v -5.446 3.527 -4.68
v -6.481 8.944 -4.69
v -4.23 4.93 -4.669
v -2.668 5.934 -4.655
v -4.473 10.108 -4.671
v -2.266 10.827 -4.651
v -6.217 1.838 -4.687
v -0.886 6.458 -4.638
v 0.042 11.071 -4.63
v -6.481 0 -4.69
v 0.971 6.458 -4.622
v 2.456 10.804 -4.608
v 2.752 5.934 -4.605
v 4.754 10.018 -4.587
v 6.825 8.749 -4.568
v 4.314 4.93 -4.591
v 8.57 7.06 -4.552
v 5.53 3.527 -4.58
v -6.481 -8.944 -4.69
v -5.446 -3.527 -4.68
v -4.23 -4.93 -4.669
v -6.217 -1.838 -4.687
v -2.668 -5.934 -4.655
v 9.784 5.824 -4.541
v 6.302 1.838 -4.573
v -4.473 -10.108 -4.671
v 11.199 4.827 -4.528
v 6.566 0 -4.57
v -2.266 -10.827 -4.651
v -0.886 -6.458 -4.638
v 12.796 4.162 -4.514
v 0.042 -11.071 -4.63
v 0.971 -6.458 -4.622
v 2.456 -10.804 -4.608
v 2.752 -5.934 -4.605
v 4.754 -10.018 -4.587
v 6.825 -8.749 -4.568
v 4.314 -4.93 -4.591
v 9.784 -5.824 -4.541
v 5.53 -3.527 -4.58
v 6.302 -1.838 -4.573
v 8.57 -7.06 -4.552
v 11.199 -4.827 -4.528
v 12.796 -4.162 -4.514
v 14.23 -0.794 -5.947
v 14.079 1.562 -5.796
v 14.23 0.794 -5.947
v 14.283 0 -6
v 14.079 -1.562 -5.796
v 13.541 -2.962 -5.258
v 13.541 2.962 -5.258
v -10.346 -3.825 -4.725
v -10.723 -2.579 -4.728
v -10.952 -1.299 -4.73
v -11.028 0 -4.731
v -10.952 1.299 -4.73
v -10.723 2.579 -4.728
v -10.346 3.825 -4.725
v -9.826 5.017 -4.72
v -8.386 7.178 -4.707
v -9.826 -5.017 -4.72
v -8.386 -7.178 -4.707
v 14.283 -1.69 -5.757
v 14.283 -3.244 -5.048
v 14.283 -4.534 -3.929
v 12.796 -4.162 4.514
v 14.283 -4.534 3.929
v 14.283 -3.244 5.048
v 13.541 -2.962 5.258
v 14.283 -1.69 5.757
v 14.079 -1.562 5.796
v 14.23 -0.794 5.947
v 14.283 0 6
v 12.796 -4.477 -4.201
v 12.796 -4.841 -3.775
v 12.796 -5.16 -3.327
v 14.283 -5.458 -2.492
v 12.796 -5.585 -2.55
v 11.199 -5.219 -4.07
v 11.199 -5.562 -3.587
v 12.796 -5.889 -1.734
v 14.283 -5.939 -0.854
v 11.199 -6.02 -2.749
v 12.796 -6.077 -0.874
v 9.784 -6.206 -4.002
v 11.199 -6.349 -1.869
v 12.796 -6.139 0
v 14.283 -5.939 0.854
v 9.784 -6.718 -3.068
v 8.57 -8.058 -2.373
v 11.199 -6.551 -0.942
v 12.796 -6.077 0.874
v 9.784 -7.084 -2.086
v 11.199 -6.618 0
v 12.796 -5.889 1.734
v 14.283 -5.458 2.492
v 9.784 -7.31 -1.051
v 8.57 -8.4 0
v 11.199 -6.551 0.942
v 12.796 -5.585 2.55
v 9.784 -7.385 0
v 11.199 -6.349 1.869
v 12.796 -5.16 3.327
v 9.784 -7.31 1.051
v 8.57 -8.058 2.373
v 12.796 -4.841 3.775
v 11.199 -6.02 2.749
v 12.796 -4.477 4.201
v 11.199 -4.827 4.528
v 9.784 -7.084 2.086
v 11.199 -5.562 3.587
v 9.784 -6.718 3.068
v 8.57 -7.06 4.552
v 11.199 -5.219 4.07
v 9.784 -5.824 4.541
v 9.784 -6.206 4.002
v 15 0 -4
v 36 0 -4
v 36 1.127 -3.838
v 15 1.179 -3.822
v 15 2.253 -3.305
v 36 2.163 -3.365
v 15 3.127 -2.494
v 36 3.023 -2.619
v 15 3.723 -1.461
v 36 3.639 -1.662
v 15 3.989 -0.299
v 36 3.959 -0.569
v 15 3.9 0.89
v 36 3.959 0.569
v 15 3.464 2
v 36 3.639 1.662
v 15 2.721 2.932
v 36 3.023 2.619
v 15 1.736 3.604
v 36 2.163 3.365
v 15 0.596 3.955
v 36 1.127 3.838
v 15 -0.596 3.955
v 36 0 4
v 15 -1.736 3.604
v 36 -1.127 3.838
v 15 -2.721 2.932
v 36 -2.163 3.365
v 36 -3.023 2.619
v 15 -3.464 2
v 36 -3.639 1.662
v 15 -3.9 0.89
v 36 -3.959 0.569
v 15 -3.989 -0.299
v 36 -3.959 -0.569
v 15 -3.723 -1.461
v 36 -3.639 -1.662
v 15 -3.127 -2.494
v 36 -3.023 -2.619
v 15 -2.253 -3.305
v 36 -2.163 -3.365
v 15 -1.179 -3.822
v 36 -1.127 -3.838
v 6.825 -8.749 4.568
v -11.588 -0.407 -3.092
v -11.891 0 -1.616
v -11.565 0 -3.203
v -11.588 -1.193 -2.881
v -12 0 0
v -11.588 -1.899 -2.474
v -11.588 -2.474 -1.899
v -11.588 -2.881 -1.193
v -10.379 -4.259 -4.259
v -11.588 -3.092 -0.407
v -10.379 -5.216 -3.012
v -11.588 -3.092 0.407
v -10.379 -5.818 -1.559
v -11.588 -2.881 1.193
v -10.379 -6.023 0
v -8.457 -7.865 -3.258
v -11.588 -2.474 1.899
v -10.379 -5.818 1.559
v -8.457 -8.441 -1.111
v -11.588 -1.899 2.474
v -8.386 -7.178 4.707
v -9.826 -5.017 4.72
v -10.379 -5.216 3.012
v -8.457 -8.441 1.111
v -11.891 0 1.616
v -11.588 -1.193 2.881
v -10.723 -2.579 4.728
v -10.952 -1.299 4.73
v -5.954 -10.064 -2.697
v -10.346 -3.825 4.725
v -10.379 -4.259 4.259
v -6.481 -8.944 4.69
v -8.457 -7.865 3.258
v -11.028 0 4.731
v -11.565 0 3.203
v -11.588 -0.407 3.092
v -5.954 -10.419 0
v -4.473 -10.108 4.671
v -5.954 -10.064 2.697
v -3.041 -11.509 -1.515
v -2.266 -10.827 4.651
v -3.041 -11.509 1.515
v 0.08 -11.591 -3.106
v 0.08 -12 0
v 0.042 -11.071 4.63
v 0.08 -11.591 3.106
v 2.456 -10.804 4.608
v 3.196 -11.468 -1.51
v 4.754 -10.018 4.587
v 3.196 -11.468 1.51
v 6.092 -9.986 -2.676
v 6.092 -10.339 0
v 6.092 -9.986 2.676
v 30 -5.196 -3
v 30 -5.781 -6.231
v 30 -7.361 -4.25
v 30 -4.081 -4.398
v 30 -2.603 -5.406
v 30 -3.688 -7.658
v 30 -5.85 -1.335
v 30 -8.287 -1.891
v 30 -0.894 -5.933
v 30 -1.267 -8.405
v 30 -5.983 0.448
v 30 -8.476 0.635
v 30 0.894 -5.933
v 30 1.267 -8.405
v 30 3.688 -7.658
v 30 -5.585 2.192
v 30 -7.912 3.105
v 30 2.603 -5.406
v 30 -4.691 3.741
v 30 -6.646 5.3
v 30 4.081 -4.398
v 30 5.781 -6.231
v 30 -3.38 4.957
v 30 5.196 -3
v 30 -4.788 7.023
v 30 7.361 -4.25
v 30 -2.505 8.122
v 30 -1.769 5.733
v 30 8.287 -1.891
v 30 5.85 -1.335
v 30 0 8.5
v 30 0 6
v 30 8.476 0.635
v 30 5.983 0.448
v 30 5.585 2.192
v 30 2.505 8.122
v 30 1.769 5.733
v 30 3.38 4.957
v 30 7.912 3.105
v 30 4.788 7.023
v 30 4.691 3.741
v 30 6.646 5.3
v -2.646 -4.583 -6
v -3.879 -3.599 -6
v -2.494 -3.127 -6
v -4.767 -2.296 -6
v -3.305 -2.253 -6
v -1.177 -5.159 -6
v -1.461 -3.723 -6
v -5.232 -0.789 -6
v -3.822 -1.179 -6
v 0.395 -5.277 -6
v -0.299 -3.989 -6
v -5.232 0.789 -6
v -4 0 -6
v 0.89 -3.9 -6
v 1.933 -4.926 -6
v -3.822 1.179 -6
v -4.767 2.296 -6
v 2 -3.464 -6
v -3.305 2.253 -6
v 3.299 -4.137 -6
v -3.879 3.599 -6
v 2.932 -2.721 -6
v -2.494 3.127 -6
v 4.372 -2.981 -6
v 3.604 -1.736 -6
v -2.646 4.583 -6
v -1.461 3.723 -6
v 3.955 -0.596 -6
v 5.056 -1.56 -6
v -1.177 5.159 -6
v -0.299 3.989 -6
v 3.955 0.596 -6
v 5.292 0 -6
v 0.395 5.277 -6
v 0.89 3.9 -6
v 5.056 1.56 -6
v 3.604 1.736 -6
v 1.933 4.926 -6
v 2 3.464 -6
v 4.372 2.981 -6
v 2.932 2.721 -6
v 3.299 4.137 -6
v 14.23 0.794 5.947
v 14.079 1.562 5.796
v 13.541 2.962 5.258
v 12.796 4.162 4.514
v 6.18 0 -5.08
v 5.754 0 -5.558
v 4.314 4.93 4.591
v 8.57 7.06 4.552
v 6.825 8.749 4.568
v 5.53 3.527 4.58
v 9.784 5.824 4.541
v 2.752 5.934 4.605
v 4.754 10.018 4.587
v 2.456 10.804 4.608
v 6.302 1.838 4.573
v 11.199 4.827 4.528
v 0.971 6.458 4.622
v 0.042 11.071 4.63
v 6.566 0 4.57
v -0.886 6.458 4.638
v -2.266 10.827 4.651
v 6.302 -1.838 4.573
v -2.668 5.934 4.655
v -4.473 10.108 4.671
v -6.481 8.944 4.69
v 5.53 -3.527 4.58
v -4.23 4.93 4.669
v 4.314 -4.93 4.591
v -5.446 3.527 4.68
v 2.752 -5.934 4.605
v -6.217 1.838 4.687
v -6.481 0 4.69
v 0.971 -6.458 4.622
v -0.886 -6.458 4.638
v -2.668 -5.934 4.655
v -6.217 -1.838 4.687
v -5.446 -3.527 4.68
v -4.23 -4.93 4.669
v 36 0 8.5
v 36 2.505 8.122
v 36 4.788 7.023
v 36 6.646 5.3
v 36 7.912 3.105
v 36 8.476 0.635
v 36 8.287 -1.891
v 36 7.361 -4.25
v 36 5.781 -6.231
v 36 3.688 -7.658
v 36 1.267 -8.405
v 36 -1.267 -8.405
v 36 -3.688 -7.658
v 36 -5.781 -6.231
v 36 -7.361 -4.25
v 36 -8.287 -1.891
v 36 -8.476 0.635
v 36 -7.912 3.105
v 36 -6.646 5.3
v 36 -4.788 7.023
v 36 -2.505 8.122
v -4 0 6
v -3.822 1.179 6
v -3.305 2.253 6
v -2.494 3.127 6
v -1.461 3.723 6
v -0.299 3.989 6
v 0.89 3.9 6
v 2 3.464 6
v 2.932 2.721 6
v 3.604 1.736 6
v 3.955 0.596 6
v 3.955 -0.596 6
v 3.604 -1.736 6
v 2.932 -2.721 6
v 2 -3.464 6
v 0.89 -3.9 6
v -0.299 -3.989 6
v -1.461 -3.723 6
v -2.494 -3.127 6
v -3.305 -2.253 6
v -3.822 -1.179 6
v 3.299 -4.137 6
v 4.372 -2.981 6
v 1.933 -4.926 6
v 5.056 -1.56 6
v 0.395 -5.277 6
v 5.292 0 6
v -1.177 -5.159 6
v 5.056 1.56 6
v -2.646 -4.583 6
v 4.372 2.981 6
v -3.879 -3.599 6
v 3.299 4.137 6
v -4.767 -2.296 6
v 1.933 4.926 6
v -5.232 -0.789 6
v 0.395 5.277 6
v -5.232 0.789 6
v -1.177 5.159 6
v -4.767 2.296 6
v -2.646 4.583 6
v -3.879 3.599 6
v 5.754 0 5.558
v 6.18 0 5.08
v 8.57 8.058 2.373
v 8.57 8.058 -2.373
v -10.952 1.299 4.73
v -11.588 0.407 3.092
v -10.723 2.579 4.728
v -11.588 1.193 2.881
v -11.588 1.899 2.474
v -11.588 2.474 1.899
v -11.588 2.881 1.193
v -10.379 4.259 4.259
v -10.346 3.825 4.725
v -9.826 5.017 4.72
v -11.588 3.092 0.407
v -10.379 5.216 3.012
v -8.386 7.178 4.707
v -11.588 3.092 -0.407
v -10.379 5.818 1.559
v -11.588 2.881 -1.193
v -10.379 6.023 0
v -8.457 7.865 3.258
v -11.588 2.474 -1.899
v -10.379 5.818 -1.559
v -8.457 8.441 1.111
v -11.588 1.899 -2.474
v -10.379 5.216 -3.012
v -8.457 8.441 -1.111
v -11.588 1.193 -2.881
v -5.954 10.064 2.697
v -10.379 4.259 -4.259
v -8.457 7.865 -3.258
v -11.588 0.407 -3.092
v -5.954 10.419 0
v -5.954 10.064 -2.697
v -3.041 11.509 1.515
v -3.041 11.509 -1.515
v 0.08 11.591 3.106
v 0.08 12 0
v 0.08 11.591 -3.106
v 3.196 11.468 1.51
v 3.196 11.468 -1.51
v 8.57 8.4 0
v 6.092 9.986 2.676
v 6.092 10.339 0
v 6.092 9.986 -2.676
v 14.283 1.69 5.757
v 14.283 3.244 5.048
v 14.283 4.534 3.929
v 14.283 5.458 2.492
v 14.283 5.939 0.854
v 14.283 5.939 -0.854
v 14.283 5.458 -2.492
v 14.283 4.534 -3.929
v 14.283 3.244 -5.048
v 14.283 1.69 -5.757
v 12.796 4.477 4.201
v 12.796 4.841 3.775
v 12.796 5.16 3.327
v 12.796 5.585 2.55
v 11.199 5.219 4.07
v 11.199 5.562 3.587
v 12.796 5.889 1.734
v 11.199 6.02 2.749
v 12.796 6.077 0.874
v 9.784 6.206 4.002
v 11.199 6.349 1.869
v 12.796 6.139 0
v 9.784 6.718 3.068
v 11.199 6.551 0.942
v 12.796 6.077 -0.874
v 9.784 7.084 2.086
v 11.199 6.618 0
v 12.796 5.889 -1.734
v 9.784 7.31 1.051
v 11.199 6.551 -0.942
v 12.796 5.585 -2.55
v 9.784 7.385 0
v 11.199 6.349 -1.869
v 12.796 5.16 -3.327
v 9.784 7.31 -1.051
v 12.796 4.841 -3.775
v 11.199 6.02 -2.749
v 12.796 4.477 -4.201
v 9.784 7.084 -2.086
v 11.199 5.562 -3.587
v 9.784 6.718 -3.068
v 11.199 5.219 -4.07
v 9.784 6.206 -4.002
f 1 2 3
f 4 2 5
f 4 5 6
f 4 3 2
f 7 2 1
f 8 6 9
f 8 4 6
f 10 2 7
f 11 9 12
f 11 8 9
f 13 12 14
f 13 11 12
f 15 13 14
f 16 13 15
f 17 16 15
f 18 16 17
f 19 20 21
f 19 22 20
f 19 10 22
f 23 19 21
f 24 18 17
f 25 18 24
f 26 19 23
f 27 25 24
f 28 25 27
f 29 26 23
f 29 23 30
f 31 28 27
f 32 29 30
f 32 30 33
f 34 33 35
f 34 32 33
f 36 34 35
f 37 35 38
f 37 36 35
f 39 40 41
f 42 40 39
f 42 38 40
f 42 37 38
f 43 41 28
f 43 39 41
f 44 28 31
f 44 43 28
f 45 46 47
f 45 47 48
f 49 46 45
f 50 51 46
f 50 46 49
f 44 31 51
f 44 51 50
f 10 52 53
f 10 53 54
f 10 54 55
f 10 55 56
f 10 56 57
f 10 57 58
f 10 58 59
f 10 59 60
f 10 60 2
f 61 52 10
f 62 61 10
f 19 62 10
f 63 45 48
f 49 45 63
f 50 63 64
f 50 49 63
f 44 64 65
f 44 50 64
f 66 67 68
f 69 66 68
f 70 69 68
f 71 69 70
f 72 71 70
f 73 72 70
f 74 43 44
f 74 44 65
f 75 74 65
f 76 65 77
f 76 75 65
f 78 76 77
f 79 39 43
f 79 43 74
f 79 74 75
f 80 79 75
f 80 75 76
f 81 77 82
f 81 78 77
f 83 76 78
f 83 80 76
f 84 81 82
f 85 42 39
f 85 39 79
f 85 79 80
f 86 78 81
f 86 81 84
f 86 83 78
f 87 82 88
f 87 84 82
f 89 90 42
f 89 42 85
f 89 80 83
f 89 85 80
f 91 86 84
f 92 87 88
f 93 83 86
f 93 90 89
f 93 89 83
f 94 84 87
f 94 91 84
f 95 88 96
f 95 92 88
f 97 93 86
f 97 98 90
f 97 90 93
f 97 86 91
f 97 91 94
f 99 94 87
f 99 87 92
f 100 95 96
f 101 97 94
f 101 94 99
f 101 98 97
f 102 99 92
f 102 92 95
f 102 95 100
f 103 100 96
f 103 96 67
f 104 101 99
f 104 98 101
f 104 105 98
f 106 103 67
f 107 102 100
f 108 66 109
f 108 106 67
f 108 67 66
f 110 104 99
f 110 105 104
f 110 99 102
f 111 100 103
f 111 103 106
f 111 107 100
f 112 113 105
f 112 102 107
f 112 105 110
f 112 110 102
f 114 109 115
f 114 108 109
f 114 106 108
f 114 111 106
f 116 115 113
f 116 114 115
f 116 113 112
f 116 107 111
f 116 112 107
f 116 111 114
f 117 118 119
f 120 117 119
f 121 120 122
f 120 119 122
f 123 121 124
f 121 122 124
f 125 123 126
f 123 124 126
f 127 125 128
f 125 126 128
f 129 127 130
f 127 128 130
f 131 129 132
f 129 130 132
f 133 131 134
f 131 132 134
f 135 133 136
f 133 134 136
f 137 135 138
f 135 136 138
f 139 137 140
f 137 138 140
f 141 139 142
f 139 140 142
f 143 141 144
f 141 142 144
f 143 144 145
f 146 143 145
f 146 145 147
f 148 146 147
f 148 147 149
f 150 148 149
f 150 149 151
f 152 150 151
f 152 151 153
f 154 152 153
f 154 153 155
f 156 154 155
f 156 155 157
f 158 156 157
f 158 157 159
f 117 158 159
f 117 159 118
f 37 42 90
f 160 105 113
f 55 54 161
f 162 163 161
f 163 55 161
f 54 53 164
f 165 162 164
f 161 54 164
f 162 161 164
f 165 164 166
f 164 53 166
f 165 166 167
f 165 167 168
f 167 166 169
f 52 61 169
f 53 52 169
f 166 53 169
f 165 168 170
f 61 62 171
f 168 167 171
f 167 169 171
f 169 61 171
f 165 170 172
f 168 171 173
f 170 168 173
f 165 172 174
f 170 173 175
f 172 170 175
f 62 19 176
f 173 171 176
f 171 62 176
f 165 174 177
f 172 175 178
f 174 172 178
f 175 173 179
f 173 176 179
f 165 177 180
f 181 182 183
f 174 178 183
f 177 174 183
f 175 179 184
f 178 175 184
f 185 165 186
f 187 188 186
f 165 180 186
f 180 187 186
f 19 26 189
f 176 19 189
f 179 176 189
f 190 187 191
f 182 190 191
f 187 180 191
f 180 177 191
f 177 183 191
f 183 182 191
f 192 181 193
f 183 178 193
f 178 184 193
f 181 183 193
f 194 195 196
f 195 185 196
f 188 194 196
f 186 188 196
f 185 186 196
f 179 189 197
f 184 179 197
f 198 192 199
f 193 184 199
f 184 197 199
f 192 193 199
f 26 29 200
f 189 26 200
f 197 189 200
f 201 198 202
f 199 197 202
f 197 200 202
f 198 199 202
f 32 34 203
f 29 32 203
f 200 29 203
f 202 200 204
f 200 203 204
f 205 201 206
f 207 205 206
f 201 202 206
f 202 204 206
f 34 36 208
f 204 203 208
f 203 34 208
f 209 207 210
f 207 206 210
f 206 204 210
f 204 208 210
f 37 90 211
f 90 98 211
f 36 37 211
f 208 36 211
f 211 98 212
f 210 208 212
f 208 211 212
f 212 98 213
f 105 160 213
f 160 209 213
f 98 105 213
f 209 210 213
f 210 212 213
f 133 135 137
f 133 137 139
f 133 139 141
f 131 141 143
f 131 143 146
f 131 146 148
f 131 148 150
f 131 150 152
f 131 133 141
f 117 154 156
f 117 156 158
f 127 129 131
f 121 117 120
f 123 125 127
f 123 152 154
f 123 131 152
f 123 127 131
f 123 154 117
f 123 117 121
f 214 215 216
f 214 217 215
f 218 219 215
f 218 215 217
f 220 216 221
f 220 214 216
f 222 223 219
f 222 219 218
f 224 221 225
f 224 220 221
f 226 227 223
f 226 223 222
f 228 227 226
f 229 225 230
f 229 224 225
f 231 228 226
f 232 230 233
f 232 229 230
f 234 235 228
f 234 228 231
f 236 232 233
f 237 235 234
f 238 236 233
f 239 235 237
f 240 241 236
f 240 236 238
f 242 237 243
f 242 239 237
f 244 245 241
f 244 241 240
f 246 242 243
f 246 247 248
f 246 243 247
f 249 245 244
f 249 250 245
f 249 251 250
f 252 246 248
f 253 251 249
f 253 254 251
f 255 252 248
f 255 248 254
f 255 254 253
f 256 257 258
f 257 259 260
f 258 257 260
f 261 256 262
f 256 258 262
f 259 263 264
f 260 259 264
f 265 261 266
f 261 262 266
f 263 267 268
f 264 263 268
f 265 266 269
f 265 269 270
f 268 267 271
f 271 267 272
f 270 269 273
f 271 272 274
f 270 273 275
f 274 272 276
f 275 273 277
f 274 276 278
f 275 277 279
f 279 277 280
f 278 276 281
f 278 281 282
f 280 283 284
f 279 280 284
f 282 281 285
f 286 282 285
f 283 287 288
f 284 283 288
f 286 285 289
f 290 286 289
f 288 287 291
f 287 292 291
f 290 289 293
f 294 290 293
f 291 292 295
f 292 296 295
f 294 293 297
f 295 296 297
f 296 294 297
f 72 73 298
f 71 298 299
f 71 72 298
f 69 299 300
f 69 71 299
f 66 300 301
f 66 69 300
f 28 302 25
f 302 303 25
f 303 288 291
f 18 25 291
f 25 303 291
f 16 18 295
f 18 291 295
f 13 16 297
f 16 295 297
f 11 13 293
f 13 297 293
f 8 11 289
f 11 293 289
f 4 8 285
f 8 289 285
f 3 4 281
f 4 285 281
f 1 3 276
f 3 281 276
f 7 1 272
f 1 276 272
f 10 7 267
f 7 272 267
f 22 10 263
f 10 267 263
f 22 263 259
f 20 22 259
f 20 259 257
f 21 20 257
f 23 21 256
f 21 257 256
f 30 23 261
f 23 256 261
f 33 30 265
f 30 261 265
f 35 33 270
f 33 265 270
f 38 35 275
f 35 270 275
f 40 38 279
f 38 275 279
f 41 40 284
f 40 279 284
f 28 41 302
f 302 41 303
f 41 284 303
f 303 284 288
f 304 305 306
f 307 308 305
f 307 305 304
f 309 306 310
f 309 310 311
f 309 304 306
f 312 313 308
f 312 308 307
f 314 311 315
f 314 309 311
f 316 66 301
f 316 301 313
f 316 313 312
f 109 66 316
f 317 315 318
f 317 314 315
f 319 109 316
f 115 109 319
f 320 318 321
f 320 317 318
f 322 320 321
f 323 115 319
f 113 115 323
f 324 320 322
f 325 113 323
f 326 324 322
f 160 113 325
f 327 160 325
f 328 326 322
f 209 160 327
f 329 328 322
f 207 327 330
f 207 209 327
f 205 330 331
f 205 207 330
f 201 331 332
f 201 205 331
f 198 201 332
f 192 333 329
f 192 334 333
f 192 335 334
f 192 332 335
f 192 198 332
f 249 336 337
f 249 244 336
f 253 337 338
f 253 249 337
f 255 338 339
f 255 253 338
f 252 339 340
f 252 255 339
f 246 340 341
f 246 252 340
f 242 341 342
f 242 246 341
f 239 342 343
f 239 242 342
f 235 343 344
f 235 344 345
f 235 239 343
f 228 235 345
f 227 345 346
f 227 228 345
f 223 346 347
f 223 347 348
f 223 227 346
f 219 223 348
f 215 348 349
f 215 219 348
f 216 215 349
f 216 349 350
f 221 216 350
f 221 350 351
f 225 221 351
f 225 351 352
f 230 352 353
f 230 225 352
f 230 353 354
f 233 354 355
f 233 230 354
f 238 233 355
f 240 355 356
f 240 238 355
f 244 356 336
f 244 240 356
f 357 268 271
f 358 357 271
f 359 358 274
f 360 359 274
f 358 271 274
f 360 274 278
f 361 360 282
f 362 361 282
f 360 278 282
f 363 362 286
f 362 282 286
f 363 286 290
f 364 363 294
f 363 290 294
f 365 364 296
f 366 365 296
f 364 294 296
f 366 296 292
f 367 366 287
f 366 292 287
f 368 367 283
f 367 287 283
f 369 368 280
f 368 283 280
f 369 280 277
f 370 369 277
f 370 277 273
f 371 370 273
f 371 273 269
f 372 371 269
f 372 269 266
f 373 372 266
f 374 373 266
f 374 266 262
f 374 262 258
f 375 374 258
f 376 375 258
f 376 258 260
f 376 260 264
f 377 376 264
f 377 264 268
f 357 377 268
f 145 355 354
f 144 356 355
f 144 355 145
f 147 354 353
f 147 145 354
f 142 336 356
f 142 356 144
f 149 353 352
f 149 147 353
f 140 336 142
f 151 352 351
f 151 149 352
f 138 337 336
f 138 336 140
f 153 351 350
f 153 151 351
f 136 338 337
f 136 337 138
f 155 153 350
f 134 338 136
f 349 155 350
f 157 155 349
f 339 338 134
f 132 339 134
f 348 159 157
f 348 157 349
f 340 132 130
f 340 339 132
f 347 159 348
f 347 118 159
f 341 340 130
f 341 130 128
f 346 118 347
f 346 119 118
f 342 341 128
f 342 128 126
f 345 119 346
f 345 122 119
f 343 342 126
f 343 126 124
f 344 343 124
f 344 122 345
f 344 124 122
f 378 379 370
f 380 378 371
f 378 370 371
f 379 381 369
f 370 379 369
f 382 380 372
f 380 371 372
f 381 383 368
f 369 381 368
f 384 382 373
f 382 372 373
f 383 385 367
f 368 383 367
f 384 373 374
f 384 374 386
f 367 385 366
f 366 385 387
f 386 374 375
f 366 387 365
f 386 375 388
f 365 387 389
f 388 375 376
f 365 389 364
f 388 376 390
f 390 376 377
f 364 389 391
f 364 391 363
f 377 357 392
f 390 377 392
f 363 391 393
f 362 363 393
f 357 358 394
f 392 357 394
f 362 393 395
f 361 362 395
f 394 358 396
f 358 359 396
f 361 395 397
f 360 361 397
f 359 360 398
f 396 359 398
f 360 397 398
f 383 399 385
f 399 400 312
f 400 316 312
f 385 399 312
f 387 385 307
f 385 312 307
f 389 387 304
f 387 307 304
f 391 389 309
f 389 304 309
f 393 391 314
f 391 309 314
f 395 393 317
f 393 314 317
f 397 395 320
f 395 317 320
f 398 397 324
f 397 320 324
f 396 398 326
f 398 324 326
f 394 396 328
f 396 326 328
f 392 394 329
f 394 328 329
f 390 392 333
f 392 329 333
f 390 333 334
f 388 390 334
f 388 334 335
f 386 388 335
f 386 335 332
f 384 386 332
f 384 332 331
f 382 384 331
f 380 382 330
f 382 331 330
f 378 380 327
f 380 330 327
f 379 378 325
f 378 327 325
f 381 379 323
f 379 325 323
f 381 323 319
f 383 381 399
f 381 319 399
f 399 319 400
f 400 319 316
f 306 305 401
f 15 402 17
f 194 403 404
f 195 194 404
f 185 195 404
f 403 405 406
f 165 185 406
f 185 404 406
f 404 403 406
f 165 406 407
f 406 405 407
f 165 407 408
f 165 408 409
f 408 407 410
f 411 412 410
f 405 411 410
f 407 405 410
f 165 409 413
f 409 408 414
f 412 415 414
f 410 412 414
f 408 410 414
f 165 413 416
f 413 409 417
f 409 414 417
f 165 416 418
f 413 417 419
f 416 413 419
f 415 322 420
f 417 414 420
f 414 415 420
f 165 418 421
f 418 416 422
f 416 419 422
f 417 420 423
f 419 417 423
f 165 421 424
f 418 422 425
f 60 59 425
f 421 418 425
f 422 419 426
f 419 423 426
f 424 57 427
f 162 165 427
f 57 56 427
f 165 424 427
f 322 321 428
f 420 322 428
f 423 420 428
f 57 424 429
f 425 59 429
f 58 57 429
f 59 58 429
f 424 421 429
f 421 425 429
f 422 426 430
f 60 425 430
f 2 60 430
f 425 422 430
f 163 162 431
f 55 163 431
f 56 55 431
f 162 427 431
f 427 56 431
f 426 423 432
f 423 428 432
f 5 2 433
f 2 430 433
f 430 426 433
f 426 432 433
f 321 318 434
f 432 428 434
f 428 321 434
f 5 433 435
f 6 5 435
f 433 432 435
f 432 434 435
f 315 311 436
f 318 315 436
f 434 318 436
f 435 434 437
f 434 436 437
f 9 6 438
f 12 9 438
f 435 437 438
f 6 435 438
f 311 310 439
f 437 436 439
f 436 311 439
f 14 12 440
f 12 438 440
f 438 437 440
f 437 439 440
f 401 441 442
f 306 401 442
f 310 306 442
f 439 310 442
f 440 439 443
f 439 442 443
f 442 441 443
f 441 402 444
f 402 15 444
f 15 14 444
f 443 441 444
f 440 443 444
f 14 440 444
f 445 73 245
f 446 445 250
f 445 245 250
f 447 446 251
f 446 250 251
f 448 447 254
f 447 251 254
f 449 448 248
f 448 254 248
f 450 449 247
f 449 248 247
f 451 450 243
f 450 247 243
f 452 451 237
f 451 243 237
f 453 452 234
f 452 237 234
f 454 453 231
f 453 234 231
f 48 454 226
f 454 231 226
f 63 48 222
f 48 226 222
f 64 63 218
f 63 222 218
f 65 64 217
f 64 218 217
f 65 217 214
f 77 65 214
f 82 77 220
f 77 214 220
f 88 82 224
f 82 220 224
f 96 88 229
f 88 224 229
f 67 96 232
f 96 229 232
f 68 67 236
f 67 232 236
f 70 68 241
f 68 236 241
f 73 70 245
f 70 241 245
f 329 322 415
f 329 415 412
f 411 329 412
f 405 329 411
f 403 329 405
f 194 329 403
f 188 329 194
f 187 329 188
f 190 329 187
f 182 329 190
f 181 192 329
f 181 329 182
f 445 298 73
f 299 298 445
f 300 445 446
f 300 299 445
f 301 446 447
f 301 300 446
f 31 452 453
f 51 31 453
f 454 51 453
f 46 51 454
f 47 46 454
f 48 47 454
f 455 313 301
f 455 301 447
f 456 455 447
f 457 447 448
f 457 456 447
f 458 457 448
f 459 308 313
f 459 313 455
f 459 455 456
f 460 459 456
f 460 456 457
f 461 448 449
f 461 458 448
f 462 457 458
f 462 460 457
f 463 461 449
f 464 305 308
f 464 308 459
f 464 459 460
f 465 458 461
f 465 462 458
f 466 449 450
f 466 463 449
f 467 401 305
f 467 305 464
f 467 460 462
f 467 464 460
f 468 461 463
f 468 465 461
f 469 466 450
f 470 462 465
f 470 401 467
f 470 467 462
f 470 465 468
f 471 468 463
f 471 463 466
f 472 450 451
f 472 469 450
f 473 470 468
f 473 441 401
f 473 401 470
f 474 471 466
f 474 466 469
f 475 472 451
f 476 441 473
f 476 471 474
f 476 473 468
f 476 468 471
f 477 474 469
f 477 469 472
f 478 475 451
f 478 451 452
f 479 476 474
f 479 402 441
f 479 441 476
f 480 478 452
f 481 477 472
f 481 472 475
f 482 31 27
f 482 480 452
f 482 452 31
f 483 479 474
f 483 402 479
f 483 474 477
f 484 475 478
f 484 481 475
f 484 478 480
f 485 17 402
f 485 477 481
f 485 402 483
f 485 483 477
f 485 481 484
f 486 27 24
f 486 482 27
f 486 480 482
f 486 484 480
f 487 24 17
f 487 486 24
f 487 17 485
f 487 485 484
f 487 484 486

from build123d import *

# Parameters (mm, degrees)
CUT_EXTRUDE_1_DEPTH = 12.5
SKETCH_4_R          = 4
CUT_EXTRUDE_2_DEPTH = 21
SKETCH_6_R          = 4
CUT_EXTRUDE_3_DEPTH = 21


with BuildPart() as part:
    # 草图1 → 旋转3 (revolve)
    with BuildSketch(Plane.XY):
        with BuildLine():
            Line((36, 0), (36, 8.5))
            Line((36, 8.5), (30, 8.5))
            Line((30, 8.5), (30, 6))
            Line((30, 6), (14.282856857, 6))
            ThreePointArc((14.282856857, 6), (11.18447018, 6.624364434), (8.569714114, 8.4))
            ThreePointArc((8.569714114, 8.4), (-4.536707541, 11.109378231), (-12, 0))
            Line((-12, 0), (-4, 0))
            ThreePointArc((-4, 0), (0, 4), (4, 0))
            Line((4, 0), (36, 0))
        make_face()
    revolve(axis=Axis((36, 0, 0), (-1, 0, 0)))

    # 草图2 → 切除-拉伸1 (cut, symmetric)
    with BuildSketch(Plane(origin=(0, 0, 0), x_dir=(1, 0, 0), z_dir=(0, 1, 0))):
        with BuildLine():
            Line((12.79642365, 4.513566798), (14.282856857, 6))
            Line((14.282856857, 6), (5.630326423, 10.597142276))
            ThreePointArc((5.630326424, 10.597142276), (-3.985808769, 11.318715853), (-11.028032539, 4.731014522))
            Line((-11.028032539, 4.731014521), (-6.48139111, 4.68951696))
            Line((-6.48139111, 4.68951696), (12.79642365, 4.513566798))
        make_face()
        with BuildLine():
            Line((5.630326419, -10.597142273), (14.282856857, -6))
            Line((14.282856857, -6), (12.796423652, -4.513566795))
            Line((12.796423652, -4.513566795), (-6.481391109, -4.689516958))
            Line((-6.481391109, -4.689516958), (-11.028032538, -4.731014519))
            ThreePointArc((-11.028032538, -4.731014519), (-3.98580877, -11.318715847), (5.630326419, -10.597142274))
        make_face()
    extrude(amount=CUT_EXTRUDE_1_DEPTH, both=True, mode=Mode.SUBTRACT)

    # 草图3 → 旋转6 (revolve)
    with BuildSketch(Plane(origin=(0, 0, 0), x_dir=(1, 0, 0), z_dir=(0, 1, 0))):
        with BuildLine():
            Line((6.570843405, -4.563333972), (6.570843405, 4.563333972))
            ThreePointArc((6.570843405, 4.563333972), (5.974513841, 5.320261682), (5.291502622, 6))
            Line((5.291502622, 6), (0, 6))
            Line((0, 6), (0, -6))
            Line((0, -6), (5.291502622, -6))
            ThreePointArc((5.291502622, -6), (5.974513841, -5.320261682), (6.570843405, -4.563333972))
        make_face()
    revolve(axis=Axis((0, 0, -6), (0, 0, 1)))

    # 草图4 → 切除-拉伸2 (cut)
    with BuildSketch(Plane(origin=(0, 0, -6), x_dir=(-1, 0, 0), z_dir=(0, 0, -1))):
        Circle(SKETCH_4_R)
    extrude(amount=-CUT_EXTRUDE_2_DEPTH, mode=Mode.SUBTRACT)

    # 草图6 → 切除-拉伸3 (cut)
    with BuildSketch(Plane(origin=(36, 0, 0), x_dir=(0, 0, -1), z_dir=(1, 0, 0))):
        Circle(SKETCH_6_R)
    extrude(amount=-CUT_EXTRUDE_3_DEPTH, mode=Mode.SUBTRACT)


solid = part.part
